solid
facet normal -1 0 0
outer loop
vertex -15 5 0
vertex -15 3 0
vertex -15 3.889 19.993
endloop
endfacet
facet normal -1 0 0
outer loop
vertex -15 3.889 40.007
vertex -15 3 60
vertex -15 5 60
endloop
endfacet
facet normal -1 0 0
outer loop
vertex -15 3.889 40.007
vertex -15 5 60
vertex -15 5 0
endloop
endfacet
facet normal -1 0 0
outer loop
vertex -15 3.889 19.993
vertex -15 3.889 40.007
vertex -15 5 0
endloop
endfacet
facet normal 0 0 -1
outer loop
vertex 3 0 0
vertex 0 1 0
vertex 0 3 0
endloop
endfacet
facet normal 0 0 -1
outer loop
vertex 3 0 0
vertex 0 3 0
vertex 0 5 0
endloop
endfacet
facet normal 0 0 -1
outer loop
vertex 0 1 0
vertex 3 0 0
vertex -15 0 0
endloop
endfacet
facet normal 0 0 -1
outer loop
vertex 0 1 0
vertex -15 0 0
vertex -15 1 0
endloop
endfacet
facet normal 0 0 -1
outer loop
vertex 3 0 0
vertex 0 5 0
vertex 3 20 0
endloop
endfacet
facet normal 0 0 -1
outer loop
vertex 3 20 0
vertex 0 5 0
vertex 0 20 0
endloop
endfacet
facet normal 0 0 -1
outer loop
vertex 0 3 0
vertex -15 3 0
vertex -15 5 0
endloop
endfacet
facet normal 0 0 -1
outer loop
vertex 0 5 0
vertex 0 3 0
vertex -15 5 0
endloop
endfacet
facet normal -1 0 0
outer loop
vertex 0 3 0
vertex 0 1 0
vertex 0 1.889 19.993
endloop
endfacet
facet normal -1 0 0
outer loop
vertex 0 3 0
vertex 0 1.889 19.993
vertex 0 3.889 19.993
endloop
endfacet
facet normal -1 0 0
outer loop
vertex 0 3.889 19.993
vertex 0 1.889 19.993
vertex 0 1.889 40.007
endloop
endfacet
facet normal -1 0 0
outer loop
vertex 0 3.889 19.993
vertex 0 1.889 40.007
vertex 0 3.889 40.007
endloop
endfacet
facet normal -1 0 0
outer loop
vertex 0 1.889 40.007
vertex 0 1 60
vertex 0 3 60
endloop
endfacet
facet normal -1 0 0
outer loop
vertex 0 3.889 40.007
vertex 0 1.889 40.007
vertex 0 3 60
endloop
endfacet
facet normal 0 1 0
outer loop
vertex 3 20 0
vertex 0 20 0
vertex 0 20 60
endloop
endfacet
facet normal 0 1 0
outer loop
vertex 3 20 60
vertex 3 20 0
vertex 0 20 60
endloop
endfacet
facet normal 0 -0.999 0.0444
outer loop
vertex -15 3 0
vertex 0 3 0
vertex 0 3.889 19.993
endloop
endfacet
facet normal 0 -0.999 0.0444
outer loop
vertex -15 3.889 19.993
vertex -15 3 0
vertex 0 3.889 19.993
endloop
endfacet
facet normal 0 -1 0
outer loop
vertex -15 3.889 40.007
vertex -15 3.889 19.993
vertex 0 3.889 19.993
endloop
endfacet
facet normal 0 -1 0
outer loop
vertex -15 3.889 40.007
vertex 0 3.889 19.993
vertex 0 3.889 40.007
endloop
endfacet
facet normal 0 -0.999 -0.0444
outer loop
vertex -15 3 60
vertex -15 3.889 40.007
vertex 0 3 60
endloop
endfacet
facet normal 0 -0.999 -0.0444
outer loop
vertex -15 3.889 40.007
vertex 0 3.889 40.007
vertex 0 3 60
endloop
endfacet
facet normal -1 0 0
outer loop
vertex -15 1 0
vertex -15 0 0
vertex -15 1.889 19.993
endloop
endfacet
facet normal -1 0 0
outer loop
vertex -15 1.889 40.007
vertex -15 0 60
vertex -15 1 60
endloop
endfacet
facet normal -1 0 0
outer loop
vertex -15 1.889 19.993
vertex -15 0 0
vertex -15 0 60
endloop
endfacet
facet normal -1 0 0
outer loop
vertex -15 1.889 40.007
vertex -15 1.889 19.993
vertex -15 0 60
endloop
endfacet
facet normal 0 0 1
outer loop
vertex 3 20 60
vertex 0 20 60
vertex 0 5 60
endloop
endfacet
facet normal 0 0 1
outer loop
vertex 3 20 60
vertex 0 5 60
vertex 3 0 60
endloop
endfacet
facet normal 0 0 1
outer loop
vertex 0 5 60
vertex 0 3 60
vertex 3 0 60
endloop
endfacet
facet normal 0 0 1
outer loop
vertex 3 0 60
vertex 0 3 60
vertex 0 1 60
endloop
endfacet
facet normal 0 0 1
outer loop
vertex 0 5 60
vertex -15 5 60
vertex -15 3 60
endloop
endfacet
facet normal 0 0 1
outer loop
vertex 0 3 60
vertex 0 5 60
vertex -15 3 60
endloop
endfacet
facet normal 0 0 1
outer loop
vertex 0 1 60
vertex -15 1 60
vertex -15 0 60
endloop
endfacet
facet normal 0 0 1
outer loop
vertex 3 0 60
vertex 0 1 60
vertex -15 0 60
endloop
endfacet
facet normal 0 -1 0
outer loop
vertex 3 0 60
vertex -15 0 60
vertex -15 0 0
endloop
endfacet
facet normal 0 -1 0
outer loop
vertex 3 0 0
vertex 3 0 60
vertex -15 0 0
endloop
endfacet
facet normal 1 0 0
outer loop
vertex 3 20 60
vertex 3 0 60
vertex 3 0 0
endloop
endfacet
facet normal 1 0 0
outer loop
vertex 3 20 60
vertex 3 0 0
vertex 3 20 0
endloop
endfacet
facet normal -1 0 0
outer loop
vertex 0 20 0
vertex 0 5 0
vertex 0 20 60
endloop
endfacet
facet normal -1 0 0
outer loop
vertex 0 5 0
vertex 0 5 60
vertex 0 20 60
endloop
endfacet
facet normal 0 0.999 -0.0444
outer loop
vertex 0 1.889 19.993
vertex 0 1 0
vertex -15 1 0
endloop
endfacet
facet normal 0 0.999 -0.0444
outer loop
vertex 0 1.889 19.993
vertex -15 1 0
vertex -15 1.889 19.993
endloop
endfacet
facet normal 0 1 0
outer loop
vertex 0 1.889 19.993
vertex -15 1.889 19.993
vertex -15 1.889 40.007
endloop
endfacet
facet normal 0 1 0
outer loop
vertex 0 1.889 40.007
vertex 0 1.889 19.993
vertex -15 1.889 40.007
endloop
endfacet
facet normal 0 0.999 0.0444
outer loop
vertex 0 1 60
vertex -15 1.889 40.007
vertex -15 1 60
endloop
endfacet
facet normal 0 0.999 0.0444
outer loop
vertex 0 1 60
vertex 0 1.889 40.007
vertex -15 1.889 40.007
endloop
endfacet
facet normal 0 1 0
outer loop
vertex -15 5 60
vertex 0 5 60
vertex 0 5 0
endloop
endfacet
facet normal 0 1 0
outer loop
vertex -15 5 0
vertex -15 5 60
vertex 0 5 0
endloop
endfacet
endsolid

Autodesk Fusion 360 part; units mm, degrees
sketch "Sketch1" plane through (0, 0, 0) normal (1, 0, 0) x (0, 1, 0)
  line L0 (0, 0) -> (20, 0)
  line L1 (20, 0) -> (20, 60)
  line L2 (20, 60) -> (0, 60)
  line L3 (0, 60) -> (0, 0)
  line L4 (5, 60) -> (5, 0)
  arc A0 (1, 0) -> (1, 60) centre (-448.5, 30) ccw
  arc A1 (3, 0) -> (3, 60) centre (-446.5, 30) ccw
  line L5 (0, 30) -> (5, 30) construction
  line L6 (2, 30) -> (2.3932, 29.5453) construction
  line L7 (4, 30) -> (3.7548, 30.2991) construction
  dimension "d3" = 60
  dimension "d4" = 20
  dimension "d5" = 5
  dimension "d6" = 1
  dimension "d7" = 2
  dimension "d8" = 1
  dimension "d9" = 2
  dimension "d16" = 2
  dimension "d17" = 2
extrude "Extrude2" add sketch "Sketch1" along normal blind 3
extrude "Extrude3" add sketch "Sketch1" against normal blind 15 contours L0 L2 L3 A0 | L0 L2 L4 A1
equation "d8 = d6"
equation "d9 = d7"
